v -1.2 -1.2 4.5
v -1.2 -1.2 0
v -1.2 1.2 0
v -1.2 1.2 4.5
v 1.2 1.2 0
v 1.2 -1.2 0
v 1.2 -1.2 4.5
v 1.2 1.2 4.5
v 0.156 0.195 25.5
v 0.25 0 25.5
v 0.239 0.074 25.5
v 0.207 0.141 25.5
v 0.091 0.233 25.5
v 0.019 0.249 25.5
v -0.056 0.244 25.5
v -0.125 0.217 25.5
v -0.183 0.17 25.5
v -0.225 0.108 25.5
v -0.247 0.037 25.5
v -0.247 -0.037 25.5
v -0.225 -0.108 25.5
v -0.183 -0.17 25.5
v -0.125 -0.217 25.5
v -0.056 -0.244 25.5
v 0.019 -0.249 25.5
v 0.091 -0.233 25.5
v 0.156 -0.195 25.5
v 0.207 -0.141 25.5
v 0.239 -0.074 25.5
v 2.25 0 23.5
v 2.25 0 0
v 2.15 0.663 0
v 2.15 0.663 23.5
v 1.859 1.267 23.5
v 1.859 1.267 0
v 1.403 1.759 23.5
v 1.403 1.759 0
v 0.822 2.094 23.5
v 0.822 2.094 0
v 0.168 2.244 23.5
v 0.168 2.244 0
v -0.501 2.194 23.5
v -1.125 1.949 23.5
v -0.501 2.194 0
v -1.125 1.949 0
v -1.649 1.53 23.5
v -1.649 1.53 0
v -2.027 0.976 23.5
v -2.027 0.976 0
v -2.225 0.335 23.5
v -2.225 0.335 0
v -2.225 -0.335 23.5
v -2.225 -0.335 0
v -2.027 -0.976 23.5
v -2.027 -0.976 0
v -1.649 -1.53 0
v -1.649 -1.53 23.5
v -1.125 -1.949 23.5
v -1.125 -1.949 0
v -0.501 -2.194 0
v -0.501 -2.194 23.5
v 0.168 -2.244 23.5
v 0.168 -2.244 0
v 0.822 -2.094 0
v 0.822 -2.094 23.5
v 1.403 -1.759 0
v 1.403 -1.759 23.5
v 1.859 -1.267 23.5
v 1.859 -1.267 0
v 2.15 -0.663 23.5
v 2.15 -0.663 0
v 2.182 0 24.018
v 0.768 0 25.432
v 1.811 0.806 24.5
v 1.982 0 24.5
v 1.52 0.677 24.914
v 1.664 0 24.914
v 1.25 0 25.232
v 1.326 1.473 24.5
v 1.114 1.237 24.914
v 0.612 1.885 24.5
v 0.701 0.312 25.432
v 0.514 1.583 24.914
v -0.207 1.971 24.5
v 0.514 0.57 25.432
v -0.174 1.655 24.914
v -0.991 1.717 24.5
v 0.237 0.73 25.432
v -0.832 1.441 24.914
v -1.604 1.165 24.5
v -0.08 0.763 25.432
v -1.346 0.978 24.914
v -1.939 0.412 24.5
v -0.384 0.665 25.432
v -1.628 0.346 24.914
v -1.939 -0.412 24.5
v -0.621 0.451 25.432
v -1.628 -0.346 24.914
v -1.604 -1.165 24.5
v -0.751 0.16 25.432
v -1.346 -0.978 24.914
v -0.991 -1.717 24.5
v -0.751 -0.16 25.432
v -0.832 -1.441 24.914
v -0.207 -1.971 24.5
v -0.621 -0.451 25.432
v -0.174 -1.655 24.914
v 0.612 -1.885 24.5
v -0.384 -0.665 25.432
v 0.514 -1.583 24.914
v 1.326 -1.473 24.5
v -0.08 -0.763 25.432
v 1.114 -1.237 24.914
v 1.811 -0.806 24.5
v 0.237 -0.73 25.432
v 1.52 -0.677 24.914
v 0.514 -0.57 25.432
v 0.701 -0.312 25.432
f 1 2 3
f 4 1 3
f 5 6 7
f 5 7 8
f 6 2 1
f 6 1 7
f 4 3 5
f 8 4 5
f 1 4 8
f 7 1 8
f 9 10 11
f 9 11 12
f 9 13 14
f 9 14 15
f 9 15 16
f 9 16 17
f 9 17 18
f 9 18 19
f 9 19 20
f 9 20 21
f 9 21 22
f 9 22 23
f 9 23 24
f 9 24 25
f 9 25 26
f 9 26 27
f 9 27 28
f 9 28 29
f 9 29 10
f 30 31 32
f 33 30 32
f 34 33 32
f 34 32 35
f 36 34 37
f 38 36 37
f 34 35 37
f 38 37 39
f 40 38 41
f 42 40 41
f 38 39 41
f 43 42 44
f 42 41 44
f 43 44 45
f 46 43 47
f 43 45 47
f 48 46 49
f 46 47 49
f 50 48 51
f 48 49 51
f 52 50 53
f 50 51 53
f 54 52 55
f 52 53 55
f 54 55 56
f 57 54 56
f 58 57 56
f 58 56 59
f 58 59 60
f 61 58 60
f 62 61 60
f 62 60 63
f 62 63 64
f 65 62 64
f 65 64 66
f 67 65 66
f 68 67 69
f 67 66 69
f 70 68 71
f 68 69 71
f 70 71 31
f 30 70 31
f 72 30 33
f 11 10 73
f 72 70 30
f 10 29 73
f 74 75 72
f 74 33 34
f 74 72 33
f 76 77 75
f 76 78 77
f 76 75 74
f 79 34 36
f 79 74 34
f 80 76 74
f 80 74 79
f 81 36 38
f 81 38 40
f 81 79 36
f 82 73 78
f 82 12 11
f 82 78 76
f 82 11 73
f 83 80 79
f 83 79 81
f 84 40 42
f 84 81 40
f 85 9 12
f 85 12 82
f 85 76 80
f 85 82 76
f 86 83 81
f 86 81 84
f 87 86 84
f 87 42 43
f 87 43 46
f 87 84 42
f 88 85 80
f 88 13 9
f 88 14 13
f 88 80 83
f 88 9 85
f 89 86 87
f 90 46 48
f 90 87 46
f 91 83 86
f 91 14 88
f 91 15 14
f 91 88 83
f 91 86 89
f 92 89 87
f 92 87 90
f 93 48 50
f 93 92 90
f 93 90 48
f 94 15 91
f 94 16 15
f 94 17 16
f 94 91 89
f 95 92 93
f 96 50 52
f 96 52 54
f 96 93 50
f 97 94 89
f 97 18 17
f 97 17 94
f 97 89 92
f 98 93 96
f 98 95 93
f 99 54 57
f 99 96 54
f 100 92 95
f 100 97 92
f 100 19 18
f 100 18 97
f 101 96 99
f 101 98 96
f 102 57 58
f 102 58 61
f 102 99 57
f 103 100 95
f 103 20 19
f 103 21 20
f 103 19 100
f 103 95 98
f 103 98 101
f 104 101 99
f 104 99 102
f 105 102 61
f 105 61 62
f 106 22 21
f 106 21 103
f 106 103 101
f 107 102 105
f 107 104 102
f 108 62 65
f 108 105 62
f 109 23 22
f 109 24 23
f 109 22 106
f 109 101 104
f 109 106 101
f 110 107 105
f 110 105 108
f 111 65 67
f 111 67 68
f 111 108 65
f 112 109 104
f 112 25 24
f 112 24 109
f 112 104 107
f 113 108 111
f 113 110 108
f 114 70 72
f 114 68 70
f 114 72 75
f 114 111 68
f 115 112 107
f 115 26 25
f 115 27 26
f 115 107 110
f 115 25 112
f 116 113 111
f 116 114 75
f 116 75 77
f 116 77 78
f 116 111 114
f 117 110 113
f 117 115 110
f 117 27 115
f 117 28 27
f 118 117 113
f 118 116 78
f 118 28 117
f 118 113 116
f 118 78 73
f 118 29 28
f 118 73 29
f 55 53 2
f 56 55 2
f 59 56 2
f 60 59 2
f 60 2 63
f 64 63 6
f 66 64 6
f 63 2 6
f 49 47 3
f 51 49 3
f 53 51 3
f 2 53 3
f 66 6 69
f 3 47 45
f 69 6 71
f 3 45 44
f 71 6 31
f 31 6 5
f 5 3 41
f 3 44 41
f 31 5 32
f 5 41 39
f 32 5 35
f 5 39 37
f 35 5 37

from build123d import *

# Parameters (mm, degrees)
SKETCH_1_R          = 2.25
EXTRUDE_2_DEPTH     = 25.5
SKETCH_7_W          = 2.4
SKETCH_7_H          = 2.4
CUT_EXTRUDE_3_DEPTH = 4.5
FILLET_2_R          = 2


with BuildPart() as part:
    # 草图1 → 凸台-拉伸2 (new body)
    with BuildSketch(Plane.XY):
        Circle(SKETCH_1_R)
    extrude(amount=EXTRUDE_2_DEPTH)

    # 草图7 → 切除-拉伸3 (cut)
    with BuildSketch(Plane.XY):
        Rectangle(SKETCH_7_W, SKETCH_7_H)
    extrude(amount=CUT_EXTRUDE_3_DEPTH, mode=Mode.SUBTRACT)

    # 圆角2
    fillet_2_edges = [part.edges().sort_by_distance(p)[0] for p in [
        (-2.25, 0, 25.5),
    ]]
    fillet(fillet_2_edges, radius=FILLET_2_R)


solid = part.part
